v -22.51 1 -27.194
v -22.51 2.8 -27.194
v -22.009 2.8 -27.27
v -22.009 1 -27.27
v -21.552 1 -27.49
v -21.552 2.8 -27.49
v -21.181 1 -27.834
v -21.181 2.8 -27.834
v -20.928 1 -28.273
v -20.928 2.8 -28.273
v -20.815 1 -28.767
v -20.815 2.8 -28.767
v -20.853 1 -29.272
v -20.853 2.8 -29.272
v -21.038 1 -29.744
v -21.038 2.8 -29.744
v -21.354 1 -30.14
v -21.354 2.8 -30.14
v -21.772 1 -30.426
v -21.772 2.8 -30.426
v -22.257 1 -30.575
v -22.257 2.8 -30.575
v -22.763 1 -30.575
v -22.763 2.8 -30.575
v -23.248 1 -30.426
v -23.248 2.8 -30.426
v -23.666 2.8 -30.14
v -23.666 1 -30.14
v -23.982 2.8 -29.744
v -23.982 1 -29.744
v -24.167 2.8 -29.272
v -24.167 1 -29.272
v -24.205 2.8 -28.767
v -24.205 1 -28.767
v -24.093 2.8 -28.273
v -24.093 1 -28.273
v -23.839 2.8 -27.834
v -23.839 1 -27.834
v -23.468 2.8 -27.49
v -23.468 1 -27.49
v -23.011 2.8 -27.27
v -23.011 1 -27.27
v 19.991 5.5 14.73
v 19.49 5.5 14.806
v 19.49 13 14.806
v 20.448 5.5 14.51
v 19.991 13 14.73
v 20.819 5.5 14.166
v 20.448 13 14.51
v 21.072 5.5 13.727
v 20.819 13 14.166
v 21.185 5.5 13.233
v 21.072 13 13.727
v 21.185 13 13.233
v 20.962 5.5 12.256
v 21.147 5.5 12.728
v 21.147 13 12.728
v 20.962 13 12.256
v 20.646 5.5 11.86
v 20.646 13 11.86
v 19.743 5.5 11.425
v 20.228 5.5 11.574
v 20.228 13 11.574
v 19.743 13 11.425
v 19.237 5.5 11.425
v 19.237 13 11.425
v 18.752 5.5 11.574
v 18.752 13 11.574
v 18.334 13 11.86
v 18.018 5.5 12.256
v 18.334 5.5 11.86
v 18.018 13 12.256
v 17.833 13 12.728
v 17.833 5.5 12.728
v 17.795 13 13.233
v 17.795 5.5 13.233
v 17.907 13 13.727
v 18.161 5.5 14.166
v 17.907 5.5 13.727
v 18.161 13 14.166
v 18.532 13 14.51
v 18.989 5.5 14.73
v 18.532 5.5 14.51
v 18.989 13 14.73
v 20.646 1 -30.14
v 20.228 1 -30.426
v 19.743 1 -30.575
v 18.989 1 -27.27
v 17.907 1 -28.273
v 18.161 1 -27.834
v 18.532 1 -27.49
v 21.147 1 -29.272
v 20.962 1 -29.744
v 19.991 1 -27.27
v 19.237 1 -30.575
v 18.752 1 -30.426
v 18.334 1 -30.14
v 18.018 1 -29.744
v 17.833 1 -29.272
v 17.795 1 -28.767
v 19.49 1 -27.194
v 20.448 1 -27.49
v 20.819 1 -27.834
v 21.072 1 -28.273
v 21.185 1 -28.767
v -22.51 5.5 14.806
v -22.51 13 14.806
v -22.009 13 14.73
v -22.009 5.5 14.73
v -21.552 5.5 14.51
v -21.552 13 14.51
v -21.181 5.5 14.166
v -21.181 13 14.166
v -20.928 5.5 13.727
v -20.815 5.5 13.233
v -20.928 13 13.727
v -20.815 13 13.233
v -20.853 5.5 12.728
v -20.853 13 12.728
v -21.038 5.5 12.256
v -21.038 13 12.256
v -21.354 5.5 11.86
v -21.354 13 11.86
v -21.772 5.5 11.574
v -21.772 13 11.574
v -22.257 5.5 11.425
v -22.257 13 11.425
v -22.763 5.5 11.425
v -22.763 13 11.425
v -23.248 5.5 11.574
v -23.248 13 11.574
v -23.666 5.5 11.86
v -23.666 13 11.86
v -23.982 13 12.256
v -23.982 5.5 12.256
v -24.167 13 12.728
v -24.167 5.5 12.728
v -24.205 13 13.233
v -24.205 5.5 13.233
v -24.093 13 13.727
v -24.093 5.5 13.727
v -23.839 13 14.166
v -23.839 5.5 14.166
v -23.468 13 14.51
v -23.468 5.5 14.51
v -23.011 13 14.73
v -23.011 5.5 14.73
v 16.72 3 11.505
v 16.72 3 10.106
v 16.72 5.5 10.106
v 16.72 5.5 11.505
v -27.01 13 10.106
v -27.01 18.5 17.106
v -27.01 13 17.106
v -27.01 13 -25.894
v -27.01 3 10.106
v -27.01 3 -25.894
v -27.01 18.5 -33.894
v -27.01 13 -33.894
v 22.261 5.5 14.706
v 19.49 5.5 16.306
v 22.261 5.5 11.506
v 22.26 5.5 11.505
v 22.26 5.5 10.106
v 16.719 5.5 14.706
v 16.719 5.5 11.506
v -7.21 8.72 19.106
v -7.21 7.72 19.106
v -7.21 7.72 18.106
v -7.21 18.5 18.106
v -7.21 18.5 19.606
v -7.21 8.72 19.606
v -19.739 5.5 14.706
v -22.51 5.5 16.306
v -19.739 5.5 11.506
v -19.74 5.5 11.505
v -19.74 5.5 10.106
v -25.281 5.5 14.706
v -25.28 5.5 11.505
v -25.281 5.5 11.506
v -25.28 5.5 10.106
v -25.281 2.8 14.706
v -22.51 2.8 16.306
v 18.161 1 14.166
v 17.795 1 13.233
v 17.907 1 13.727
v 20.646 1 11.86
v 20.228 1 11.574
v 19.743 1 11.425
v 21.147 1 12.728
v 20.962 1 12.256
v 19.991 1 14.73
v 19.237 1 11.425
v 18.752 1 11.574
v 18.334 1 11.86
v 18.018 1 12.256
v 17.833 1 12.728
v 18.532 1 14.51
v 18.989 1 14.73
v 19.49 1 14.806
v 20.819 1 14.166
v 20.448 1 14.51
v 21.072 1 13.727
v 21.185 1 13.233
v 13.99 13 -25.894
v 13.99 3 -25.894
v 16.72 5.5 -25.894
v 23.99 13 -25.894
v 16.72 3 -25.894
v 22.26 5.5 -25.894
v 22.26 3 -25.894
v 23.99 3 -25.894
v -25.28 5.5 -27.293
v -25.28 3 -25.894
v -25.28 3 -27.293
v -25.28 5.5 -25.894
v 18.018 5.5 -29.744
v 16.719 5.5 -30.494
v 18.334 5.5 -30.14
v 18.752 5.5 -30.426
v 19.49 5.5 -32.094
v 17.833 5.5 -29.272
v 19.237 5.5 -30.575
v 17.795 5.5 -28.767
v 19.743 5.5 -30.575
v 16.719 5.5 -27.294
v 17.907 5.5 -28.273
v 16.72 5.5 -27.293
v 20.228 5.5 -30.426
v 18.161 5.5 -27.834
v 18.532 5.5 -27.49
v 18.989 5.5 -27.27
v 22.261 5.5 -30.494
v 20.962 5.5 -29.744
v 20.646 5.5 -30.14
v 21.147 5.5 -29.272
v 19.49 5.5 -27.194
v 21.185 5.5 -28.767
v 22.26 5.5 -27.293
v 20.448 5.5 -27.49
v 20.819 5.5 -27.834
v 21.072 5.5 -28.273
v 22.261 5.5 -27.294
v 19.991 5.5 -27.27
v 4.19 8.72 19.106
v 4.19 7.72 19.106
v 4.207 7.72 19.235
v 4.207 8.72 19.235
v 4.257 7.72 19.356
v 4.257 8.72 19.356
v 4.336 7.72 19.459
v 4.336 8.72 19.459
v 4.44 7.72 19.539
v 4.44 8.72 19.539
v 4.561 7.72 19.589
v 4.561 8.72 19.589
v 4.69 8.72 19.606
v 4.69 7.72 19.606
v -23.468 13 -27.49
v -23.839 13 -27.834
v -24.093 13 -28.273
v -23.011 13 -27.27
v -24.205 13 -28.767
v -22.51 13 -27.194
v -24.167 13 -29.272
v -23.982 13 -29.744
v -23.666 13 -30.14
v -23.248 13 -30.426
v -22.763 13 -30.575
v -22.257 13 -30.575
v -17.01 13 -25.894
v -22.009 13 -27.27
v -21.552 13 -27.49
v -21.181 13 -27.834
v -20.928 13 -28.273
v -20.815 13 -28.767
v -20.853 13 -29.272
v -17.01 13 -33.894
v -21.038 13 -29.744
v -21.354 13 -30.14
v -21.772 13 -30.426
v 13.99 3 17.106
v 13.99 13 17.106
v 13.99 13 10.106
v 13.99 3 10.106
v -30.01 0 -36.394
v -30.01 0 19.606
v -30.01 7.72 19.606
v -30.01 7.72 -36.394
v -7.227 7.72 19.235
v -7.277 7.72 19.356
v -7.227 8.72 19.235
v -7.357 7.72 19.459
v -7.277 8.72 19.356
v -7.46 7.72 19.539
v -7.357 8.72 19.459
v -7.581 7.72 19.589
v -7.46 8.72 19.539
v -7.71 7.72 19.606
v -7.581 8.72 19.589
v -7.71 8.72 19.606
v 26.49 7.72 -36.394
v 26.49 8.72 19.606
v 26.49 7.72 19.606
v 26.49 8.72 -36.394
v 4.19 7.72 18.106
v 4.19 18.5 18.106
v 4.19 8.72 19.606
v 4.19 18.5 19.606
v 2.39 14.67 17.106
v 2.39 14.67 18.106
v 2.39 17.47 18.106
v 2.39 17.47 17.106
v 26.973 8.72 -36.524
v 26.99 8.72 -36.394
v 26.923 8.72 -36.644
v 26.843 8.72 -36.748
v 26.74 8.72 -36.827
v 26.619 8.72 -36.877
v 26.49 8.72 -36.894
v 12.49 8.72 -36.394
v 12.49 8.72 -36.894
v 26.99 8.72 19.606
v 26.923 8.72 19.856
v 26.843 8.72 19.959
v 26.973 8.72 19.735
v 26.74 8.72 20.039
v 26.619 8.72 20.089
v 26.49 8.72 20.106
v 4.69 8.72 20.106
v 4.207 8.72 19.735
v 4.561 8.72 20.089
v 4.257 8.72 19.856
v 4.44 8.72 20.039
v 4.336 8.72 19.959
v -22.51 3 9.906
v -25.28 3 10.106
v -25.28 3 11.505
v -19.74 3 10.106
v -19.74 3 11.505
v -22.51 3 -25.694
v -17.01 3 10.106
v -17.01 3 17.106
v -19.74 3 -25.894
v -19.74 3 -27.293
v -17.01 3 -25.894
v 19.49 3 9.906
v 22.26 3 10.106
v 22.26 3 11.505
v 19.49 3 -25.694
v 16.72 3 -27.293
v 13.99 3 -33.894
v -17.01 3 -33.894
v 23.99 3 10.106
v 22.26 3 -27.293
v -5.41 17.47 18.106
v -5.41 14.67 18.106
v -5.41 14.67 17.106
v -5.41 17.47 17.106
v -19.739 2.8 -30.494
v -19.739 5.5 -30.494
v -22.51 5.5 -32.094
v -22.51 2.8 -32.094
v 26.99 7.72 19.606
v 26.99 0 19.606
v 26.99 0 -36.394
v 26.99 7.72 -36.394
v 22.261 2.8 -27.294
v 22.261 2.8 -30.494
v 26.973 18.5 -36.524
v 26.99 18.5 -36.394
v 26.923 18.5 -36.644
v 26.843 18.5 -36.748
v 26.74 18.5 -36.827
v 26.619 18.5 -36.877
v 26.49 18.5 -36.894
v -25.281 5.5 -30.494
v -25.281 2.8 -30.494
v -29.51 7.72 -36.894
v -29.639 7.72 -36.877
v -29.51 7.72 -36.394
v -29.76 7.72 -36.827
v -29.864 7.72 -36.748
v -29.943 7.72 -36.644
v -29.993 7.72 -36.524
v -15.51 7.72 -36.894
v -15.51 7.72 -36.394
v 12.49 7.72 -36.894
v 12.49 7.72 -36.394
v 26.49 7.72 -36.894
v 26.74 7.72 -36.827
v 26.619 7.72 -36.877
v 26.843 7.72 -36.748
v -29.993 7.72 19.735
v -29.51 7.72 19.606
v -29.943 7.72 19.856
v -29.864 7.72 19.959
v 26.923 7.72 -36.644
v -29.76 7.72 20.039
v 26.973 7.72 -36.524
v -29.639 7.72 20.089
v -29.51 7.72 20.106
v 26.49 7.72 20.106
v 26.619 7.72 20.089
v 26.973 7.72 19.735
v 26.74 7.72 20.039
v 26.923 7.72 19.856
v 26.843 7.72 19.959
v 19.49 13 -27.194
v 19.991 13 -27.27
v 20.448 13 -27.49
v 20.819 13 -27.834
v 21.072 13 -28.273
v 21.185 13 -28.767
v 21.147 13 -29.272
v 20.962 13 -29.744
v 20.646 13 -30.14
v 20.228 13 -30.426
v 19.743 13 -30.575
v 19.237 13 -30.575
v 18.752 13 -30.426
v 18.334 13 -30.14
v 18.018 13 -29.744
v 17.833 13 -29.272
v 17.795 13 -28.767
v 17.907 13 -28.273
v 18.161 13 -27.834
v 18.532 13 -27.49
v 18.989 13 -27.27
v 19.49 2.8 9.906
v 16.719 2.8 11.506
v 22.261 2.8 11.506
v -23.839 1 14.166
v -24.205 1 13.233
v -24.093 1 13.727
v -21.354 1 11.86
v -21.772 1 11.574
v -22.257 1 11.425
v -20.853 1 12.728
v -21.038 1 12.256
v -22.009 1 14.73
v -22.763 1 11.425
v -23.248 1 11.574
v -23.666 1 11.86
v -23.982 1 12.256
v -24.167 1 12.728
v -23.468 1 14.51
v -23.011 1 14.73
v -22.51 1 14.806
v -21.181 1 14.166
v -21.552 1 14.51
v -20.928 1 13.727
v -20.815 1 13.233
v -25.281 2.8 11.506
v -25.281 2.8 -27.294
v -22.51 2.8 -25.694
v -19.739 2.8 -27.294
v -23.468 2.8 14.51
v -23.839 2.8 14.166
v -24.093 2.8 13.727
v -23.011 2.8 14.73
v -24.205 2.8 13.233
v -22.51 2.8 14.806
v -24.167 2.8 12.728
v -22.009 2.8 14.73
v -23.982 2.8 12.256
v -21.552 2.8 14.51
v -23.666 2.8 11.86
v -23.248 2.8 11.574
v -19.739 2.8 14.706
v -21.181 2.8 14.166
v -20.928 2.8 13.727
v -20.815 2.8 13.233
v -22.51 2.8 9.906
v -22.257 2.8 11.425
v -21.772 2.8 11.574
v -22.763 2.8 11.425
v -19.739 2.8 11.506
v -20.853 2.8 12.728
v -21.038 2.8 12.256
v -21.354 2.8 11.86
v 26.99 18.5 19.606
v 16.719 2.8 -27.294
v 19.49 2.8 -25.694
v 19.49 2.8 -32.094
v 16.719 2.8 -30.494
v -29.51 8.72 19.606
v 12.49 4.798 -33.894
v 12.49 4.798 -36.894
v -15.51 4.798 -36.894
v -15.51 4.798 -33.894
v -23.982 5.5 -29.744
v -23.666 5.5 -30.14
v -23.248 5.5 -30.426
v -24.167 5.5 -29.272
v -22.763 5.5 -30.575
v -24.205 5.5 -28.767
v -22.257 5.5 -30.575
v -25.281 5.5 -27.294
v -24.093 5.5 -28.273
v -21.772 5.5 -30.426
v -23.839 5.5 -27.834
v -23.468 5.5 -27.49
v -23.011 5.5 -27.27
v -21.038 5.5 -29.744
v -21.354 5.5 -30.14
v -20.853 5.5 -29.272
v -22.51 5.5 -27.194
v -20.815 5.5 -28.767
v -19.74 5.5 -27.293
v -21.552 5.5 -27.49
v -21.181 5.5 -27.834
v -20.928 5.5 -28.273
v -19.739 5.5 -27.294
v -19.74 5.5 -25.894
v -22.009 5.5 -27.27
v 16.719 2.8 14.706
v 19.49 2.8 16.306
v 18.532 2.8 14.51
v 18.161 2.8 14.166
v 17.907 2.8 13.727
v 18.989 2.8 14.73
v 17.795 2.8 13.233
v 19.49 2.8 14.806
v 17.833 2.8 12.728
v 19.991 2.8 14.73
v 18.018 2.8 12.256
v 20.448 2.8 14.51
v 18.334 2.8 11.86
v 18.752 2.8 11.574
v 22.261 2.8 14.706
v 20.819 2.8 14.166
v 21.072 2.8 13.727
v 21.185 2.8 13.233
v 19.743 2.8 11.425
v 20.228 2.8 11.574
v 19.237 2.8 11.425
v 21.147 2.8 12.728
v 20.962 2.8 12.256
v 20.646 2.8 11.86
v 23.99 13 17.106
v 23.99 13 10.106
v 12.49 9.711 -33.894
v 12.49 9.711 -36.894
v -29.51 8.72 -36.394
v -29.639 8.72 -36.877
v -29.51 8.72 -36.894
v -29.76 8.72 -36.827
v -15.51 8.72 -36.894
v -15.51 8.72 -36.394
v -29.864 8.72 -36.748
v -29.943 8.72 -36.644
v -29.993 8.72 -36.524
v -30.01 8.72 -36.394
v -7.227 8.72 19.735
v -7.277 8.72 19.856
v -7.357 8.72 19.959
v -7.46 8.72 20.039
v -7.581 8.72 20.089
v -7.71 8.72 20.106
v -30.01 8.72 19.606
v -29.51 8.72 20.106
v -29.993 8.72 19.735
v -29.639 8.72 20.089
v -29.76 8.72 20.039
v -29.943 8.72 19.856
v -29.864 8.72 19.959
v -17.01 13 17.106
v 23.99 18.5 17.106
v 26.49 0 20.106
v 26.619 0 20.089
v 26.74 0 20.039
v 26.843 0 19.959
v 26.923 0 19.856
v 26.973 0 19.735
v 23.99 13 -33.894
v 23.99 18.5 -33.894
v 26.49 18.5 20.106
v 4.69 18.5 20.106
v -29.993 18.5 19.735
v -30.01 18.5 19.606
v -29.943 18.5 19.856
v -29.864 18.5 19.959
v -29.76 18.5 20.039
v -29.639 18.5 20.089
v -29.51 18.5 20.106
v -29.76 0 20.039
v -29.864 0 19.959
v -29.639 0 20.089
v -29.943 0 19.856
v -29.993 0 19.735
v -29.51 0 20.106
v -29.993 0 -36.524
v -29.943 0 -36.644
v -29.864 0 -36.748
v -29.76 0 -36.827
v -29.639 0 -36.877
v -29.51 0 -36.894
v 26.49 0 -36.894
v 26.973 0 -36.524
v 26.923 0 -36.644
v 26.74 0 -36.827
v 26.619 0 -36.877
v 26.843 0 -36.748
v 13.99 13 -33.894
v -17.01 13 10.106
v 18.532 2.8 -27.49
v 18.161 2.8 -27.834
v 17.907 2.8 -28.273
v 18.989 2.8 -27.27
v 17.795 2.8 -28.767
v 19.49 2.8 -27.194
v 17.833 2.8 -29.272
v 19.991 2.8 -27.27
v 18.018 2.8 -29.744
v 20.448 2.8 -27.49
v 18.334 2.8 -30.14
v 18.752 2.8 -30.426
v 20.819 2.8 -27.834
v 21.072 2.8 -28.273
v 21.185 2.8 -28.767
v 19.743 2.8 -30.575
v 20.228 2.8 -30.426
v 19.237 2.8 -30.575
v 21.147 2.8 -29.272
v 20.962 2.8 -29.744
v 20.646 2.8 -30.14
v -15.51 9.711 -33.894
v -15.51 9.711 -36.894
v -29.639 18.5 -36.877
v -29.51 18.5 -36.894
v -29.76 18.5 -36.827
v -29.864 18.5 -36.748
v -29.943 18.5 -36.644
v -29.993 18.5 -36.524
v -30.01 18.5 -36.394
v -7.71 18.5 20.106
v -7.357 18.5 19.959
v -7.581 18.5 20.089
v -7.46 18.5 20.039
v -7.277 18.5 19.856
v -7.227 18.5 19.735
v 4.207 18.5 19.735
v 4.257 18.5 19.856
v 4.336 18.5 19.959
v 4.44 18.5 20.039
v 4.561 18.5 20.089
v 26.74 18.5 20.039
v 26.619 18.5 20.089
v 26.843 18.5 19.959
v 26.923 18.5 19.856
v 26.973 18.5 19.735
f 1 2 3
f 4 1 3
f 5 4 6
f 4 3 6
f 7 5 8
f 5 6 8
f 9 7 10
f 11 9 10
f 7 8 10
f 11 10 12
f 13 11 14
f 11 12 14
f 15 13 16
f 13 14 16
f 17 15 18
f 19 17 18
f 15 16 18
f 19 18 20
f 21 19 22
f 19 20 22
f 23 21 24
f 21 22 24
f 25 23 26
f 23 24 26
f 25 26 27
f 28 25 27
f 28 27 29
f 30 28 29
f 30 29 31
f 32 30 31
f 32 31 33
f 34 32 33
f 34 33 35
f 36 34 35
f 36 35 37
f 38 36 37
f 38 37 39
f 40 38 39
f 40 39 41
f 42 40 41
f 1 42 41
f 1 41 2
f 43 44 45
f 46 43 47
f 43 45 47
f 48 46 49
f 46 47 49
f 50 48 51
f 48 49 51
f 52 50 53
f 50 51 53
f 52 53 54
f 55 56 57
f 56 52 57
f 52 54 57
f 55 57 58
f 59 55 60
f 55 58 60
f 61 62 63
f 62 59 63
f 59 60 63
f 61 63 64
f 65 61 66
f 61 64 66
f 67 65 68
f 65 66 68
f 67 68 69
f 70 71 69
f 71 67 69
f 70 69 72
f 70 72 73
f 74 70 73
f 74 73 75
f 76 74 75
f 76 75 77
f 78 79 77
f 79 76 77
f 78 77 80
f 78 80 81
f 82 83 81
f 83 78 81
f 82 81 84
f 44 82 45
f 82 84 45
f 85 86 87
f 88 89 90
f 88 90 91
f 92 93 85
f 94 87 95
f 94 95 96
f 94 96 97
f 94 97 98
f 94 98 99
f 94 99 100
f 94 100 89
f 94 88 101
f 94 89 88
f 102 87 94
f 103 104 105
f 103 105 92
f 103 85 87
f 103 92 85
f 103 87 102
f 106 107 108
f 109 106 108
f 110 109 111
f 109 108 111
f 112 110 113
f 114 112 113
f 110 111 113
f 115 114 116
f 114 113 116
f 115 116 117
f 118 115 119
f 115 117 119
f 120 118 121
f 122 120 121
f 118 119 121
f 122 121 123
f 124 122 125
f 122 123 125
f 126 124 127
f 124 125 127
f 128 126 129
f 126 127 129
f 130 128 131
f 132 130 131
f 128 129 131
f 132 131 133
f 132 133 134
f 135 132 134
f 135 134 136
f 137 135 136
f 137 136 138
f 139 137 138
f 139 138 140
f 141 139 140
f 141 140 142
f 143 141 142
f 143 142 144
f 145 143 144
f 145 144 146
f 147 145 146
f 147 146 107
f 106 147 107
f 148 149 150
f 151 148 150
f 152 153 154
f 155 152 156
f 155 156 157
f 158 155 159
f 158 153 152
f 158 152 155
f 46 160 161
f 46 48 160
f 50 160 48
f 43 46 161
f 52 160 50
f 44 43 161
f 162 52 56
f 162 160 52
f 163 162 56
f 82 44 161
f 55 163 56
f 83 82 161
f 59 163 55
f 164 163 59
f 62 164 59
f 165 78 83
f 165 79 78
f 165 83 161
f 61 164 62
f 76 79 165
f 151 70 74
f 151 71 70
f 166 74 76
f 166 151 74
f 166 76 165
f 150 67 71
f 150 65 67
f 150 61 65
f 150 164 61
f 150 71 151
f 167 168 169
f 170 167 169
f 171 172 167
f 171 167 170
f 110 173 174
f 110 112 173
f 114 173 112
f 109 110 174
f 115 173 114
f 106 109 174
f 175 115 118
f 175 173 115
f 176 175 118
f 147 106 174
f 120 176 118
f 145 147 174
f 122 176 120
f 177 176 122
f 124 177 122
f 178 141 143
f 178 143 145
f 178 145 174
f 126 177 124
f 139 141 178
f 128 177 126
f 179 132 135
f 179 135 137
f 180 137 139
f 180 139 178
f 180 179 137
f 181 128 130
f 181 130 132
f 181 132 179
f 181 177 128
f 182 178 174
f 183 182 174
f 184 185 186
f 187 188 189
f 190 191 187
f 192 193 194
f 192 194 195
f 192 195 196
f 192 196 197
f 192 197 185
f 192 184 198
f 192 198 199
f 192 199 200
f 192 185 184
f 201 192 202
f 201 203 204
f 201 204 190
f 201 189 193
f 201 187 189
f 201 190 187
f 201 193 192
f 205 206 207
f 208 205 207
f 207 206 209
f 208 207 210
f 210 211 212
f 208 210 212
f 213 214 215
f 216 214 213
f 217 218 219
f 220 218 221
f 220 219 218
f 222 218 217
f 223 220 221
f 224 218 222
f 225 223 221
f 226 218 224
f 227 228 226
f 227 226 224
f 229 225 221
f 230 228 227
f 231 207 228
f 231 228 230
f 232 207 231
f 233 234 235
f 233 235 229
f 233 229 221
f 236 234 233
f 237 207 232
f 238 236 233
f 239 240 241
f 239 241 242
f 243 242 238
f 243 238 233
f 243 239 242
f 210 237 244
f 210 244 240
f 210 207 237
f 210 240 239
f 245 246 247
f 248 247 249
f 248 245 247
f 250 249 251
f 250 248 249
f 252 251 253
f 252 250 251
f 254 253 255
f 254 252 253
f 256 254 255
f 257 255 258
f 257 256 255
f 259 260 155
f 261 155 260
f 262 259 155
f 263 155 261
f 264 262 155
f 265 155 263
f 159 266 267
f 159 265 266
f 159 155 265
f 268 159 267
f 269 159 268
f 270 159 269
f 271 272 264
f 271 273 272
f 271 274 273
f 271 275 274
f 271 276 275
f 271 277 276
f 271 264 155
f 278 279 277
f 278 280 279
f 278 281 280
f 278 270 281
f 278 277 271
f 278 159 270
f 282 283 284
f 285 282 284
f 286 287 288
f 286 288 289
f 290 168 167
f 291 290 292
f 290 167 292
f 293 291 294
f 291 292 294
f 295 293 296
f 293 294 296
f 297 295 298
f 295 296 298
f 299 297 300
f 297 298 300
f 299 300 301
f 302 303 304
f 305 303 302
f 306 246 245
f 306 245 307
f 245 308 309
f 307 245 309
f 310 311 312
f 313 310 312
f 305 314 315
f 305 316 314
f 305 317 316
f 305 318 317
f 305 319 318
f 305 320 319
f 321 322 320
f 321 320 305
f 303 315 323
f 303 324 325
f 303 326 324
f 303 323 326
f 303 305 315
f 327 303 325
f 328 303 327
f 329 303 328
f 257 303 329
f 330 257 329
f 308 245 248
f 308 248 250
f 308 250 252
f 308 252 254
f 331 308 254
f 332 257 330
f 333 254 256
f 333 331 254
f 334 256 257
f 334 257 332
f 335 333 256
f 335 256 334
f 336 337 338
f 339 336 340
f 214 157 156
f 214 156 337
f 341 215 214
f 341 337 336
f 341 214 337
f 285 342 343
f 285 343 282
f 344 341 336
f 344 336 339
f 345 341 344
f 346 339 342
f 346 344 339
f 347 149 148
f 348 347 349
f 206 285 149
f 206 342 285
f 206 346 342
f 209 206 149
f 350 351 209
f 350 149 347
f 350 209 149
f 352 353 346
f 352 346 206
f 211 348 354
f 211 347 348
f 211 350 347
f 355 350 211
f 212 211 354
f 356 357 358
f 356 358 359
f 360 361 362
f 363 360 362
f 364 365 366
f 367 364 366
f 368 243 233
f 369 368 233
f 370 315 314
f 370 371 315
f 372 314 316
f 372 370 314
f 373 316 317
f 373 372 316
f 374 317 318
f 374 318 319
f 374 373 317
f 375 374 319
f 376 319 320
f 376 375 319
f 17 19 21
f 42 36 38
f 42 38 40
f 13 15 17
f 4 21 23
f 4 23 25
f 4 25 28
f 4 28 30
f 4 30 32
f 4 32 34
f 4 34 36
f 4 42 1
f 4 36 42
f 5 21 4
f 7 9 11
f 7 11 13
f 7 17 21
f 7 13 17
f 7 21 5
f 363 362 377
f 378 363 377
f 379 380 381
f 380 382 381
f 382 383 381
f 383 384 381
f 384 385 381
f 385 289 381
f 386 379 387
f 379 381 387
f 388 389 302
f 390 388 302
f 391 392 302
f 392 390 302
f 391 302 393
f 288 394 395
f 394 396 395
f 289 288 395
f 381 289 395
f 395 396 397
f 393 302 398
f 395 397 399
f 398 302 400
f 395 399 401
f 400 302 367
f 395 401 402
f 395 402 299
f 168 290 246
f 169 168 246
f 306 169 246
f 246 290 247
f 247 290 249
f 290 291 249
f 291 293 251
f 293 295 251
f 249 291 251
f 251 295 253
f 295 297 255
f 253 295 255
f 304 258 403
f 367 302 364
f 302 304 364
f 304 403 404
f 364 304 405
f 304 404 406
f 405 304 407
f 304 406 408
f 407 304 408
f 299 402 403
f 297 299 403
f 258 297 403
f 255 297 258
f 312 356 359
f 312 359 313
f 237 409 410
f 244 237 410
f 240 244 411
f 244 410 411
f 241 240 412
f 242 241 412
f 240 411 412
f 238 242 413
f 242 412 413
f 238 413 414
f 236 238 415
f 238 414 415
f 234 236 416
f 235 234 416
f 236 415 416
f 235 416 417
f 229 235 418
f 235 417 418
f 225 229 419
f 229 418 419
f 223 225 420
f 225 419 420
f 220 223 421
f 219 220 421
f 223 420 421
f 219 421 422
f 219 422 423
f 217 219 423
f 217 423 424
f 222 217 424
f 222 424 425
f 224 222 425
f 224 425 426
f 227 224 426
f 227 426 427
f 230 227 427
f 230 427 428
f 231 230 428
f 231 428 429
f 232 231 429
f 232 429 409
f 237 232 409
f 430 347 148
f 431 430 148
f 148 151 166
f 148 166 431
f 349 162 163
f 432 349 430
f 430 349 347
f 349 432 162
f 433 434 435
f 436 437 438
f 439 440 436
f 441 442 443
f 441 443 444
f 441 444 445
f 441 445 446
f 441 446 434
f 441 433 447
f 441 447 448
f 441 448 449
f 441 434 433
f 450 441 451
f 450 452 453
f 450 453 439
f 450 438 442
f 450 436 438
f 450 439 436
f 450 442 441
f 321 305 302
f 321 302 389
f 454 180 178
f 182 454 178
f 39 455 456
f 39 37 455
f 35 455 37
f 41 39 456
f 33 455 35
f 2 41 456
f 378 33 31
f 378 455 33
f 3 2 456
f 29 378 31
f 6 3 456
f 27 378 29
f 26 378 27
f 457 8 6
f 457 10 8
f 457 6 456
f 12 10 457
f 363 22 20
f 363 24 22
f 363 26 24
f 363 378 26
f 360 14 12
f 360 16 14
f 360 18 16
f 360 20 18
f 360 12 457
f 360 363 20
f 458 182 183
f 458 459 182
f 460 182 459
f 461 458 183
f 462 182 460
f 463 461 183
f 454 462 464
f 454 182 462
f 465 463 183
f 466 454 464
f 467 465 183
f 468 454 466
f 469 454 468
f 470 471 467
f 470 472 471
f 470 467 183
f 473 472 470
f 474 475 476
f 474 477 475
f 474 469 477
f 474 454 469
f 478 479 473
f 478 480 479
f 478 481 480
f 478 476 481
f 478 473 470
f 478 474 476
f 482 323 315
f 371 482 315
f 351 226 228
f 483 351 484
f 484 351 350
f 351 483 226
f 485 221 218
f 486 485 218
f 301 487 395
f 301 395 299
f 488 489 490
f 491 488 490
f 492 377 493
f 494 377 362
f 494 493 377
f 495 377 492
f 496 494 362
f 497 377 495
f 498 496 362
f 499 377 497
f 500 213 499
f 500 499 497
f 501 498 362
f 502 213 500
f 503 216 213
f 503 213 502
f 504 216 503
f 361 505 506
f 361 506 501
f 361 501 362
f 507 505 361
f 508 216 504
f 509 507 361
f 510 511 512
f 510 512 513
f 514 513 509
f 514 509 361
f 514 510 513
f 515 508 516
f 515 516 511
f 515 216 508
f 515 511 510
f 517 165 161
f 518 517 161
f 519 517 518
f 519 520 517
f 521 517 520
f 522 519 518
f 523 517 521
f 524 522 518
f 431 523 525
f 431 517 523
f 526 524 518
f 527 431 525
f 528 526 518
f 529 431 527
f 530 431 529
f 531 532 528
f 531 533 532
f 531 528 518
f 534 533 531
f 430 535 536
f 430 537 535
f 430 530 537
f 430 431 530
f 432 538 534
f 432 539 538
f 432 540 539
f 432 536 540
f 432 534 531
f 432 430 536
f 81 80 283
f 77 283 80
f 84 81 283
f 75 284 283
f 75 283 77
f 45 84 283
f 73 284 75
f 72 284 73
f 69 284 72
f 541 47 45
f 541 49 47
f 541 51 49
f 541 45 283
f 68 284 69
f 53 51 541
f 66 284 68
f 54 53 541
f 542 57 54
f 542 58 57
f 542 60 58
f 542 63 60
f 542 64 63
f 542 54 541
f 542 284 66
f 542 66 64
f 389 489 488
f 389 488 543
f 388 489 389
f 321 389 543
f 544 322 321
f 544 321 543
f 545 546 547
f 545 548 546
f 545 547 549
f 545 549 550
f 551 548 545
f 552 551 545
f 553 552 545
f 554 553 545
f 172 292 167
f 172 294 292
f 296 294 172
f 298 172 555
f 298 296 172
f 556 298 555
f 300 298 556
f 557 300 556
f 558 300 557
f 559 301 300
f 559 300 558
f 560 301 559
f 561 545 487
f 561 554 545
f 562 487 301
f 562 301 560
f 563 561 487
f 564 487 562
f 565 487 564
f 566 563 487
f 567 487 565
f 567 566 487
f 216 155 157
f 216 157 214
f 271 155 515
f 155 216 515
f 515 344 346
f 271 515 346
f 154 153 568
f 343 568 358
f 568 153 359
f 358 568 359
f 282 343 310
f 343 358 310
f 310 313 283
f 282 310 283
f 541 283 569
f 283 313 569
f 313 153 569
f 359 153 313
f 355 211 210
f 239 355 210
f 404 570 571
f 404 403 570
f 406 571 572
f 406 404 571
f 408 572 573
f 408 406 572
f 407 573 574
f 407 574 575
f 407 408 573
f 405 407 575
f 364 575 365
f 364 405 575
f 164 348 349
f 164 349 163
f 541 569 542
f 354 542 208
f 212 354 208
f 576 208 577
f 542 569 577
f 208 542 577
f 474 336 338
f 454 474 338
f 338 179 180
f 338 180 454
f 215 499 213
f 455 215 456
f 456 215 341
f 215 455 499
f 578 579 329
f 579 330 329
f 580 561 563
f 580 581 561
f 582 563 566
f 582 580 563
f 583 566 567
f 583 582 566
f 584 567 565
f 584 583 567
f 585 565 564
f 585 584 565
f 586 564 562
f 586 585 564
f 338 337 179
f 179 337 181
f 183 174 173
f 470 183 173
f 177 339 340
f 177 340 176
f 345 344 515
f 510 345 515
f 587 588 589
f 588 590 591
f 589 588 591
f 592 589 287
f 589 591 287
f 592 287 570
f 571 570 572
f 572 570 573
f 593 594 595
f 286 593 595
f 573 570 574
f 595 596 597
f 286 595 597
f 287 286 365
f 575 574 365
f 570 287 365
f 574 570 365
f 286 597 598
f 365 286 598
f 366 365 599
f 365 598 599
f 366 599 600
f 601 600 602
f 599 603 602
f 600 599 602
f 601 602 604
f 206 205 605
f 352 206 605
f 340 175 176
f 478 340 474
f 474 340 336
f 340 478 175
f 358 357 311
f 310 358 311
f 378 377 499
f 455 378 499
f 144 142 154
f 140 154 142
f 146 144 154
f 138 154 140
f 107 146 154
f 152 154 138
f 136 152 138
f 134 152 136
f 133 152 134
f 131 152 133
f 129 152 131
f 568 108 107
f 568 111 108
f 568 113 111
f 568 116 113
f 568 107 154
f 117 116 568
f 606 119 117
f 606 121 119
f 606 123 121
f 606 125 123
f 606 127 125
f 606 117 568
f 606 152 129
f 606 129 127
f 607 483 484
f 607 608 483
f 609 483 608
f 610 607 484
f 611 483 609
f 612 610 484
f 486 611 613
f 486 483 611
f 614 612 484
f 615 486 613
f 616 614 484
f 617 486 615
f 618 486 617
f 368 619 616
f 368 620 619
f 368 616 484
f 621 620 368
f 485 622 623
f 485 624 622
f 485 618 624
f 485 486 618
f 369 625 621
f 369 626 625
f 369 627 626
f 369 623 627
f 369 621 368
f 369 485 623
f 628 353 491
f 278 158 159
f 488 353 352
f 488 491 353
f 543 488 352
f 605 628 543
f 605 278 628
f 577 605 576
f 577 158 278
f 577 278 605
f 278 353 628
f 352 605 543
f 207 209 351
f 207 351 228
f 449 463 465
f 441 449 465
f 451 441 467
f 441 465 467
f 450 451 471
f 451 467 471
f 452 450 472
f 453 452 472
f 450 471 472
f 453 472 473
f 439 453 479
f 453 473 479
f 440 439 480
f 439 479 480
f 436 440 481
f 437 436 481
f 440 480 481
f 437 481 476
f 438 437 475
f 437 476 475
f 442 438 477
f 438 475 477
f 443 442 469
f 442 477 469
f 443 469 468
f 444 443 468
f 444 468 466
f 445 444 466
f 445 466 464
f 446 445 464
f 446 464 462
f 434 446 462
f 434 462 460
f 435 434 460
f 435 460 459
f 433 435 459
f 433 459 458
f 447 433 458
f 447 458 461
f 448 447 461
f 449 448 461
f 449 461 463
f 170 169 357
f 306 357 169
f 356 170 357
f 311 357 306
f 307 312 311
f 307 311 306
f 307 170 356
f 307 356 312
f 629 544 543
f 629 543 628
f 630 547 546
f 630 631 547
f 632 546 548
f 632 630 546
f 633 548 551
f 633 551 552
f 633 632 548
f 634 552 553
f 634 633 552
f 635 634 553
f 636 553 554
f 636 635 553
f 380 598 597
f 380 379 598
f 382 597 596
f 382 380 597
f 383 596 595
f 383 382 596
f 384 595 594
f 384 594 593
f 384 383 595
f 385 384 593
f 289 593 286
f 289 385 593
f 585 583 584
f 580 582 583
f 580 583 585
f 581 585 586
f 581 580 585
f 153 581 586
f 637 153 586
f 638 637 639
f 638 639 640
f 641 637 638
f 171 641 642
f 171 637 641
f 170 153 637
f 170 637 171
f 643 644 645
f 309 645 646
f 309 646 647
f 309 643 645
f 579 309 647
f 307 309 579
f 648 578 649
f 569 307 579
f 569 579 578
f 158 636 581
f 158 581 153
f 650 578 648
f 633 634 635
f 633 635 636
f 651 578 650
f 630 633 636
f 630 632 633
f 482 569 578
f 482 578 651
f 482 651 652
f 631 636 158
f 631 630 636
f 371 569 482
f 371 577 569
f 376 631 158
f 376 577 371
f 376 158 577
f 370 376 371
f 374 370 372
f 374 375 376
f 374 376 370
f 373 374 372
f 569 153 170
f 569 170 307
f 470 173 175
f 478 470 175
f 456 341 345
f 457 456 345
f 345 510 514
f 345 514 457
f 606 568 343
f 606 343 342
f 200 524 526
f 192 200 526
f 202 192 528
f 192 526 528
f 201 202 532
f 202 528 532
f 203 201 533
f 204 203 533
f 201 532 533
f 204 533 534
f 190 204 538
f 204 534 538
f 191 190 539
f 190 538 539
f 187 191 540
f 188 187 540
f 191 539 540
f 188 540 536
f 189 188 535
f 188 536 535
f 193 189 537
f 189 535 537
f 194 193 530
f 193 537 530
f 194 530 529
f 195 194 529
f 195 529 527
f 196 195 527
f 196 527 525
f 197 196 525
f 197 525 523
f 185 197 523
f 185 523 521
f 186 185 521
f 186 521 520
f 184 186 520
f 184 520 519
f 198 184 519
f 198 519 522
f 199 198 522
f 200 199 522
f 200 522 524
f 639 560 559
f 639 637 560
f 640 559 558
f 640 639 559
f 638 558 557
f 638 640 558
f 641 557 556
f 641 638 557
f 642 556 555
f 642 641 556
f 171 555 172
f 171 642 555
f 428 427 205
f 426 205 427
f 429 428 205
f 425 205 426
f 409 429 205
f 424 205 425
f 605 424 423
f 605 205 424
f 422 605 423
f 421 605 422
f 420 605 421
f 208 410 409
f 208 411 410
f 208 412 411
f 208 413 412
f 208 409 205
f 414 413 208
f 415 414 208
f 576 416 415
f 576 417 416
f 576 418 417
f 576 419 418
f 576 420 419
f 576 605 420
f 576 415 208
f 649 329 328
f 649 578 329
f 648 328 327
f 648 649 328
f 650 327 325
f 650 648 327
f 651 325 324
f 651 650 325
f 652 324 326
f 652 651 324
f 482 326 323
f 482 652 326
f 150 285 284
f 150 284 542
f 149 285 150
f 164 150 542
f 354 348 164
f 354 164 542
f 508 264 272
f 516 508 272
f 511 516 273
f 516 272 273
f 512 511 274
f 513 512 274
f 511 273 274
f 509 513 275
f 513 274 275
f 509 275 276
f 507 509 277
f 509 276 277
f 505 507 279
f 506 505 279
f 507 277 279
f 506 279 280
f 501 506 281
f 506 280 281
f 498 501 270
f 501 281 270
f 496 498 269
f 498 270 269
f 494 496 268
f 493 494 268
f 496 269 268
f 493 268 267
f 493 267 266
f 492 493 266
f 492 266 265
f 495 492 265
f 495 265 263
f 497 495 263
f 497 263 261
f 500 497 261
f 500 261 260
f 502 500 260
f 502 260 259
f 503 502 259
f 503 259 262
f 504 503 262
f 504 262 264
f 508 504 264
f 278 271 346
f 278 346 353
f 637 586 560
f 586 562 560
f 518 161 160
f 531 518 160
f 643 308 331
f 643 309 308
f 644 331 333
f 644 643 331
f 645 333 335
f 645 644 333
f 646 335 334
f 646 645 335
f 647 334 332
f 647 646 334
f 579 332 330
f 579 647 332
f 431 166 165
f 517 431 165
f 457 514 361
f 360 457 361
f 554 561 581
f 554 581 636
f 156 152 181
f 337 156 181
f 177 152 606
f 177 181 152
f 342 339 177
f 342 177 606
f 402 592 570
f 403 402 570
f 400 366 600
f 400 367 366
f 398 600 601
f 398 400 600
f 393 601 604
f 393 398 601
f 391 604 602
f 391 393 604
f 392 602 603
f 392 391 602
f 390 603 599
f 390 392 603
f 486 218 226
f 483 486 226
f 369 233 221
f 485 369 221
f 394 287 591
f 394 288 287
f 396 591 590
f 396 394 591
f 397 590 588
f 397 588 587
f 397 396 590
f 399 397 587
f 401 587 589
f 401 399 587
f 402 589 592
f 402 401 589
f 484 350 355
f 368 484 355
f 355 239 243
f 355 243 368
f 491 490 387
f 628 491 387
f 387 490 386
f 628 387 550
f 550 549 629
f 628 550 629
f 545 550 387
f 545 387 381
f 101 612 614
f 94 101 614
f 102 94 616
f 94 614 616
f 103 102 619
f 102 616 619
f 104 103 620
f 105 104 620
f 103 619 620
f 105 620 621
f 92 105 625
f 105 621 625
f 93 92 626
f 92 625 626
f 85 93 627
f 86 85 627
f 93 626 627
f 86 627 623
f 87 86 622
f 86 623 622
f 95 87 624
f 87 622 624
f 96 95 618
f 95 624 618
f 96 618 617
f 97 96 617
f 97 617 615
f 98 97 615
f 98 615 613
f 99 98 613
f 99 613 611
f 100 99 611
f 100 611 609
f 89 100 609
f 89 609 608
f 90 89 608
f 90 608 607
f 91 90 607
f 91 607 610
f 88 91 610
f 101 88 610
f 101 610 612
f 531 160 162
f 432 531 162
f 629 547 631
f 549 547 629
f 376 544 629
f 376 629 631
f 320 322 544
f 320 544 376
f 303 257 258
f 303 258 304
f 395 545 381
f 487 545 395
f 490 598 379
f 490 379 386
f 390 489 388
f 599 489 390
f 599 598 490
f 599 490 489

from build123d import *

# Parameters (mm, degrees)
ESQUISSE1_W              = 57
ESQUISSE1_H              = 57
BOSS_EXTRU_1_DEPTH       = 18.5
ESQUISSE2_W              = 51
ESQUISSE2_H              = 51
ENL_V_MAT_EXTRU_1_DEPTH  = 15.5
ESQUISSE4_W              = 10
ESQUISSE4_H              = 8
BOSS_EXTRU_2_DEPTH       = 10
ESQUISSE5_W              = 10
ESQUISSE5_H              = 8
BOSS_EXTRU_3_DEPTH       = 10
ESQUISSE6_W              = 10
ESQUISSE6_H              = 7
BOSS_EXTRU_4_DEPTH       = 10
ESQUISSE7_W              = 10
ESQUISSE7_H              = 7
BOSS_EXTRU_5_DEPTH       = 10
ESQUISSE8_R              = 1.7
ENL_V_MAT_EXTRU_2_DEPTH  = 12
ESQUISSE9_R              = 1.7
ENL_V_MAT_EXTRU_3_DEPTH  = 12
ESQUISSE16_R             = 1.7
ENL_V_MAT_EXTRU_9_DEPTH  = 12
ESQUISSE17_R             = 1.7
ENL_V_MAT_EXTRU_10_DEPTH = 12
ESQUISSE21_W             = 7.8
ESQUISSE21_H             = 2.8
ENL_V_MAT_EXTRU_14_DEPTH = 3
ENL_V_START              = -7.5
ENL_V_MAT_EXTRU_18_DEPTH = 2.7
ENL_V_MAT_EXTRU_20_DEPTH = 2.7
ESQUISSE26_W             = 5.54
ESQUISSE26_H             = 2.5
ENL_V_MAT_EXTRU_21_DEPTH = 2.847955181
ENL_V_MAT_EXTRU_22_DEPTH = 2.7
ENL_V_MAT_EXTRU_24_DEPTH = 2.7
ESQUISSE23_W             = 5.54
ESQUISSE23_H             = 2.5
ENL_V_MAT_EXTRU_26_DEPTH = 2
ESQUISSE31_W             = 5.54
ESQUISSE31_H             = 2.5
ENL_V_MAT_EXTRU_27_DEPTH = 2
ESQUISSE30_W             = 5.54
ESQUISSE30_H             = 2.5
ENL_V_MAT_EXTRU_28_DEPTH = 2
ESQUISSE32_W             = 57
ESQUISSE32_H             = 1
ENL_V_MAT_EXTRU_29_DEPTH = 0.5
ESQUISSE33_W             = 57
ESQUISSE33_H             = 1
ENL_V_MAT_EXTRU_30_DEPTH = 0.5
ESQUISSE34_W             = 57
ESQUISSE34_H             = 1
ENL_V_MAT_EXTRU_31_DEPTH = 0.5
ESQUISSE35_W             = 57
ESQUISSE35_H             = 1
ENL_V_MAT_EXTRU_32_DEPTH = 0.5
ESQUISSE36_W             = 11.4
ESQUISSE36_H             = 10.780005484
ENL_V_MAT_EXTRU_33_DEPTH = 2
CONG_1_R                 = 0.5
CONG_2_R                 = 0.5
CONG_3_R                 = 0.5
CONG_4_R                 = 0.5
CONG_5_R                 = 0.5
CONG_6_R                 = 0.5
CONG_7_R                 = 0.5
CONG_8_R                 = 0.5
CONG_9_R                 = 0.5
CONG_10_R                = 0.5
CONG_11_R                = 0.5
CONG_12_R                = 0.5
ESQUISSE38_W             = 28
ESQUISSE38_H             = 4.913001224
ENL_V_MAT_EXTRU_34_DEPTH = 3


with BuildPart() as part:
    # Esquisse1 → Boss.-Extru.1 (new body)
    with BuildSketch(Plane(origin=(0, 0, 0), x_dir=(1, 0, 0), z_dir=(0, 1, 0))):
        with Locations((-1.510072399, 8.394175698)):
            Rectangle(ESQUISSE1_W, ESQUISSE1_H)
    extrude(amount=BOSS_EXTRU_1_DEPTH)

    # Esquisse2 → Enlèv. mat.-Extru.1 (cut)
    with BuildSketch(Plane(origin=(0, 18.5, 0), x_dir=(1, 0, 0), z_dir=(0, 1, 0))):
        with Locations((-1.510072399, 8.394175698)):
            Rectangle(ESQUISSE2_W, ESQUISSE2_H)
    extrude(amount=-ENL_V_MAT_EXTRU_1_DEPTH, mode=Mode.SUBTRACT)

    # Esquisse4 → Boss.-Extru.2 (add)
    with BuildSketch(Plane(origin=(0, 3, 0), x_dir=(1, 0, 0), z_dir=(0, 1, 0))):
        with Locations((-22.010072399, 29.894175698)):
            Rectangle(ESQUISSE4_W, ESQUISSE4_H)
    extrude(amount=BOSS_EXTRU_2_DEPTH)

    # Esquisse5 → Boss.-Extru.3 (add)
    with BuildSketch(Plane(origin=(0, 3, 0), x_dir=(1, 0, 0), z_dir=(0, 1, 0))):
        with Locations((18.989927601, 29.894175698)):
            Rectangle(ESQUISSE5_W, ESQUISSE5_H)
    extrude(amount=BOSS_EXTRU_3_DEPTH)

    # Esquisse6 → Boss.-Extru.4 (add)
    with BuildSketch(Plane(origin=(0, 3, 0), x_dir=(1, 0, 0), z_dir=(0, 1, 0))):
        with Locations((18.989927601, -13.605824302)):
            Rectangle(ESQUISSE6_W, ESQUISSE6_H)
    extrude(amount=BOSS_EXTRU_4_DEPTH)

    # Esquisse7 → Boss.-Extru.5 (add)
    with BuildSketch(Plane(origin=(0, 3, 0), x_dir=(1, 0, 0), z_dir=(0, 1, 0))):
        with Locations((-22.010072399, -13.605824302)):
            Rectangle(ESQUISSE7_W, ESQUISSE7_H)
    extrude(amount=BOSS_EXTRU_5_DEPTH)

    # Esquisse8 → Enlèv. mat.-Extru.2 (cut)
    with BuildSketch(Plane(origin=(0, 13, 0), x_dir=(1, 0, 0), z_dir=(0, 1, 0))):
        with Locations(Location((19.489927601, -13.105824302, 0), (0, 0, 270))):
            Circle(ESQUISSE8_R)
    extrude(amount=-ENL_V_MAT_EXTRU_2_DEPTH, mode=Mode.SUBTRACT)

    # Esquisse9 → Enlèv. mat.-Extru.3 (cut)
    with BuildSketch(Plane(origin=(0, 13, 0), x_dir=(1, 0, 0), z_dir=(0, 1, 0))):
        with Locations(Location((-22.510072399, -13.105824302, 0), (0, 0, 270))):
            Circle(ESQUISSE9_R)
    extrude(amount=-ENL_V_MAT_EXTRU_3_DEPTH, mode=Mode.SUBTRACT)

    # Esquisse16 → Enlèv. mat.-Extru.9 (cut)
    with BuildSketch(Plane(origin=(0, 13, 0), x_dir=(1, 0, 0), z_dir=(0, 1, 0))):
        with Locations(Location((-22.510072399, 28.894175698, 0), (0, 0, 270))):
            Circle(ESQUISSE16_R)
    extrude(amount=-ENL_V_MAT_EXTRU_9_DEPTH, mode=Mode.SUBTRACT)

    # Esquisse17 → Enlèv. mat.-Extru.10 (cut)
    with BuildSketch(Plane(origin=(0, 13, 0), x_dir=(1, 0, 0), z_dir=(0, 1, 0))):
        with Locations(Location((19.489927601, 28.894175698, 0), (0, 0, 270))):
            Circle(ESQUISSE17_R)
    extrude(amount=-ENL_V_MAT_EXTRU_10_DEPTH, mode=Mode.SUBTRACT)

    # Esquisse21 → Enlèv. mat.-Extru.14 (cut)
    with BuildSketch(Plane.XY.offset(20.105824302)):
        with Locations((-1.510072399, 16.07)):
            Rectangle(ESQUISSE21_W, ESQUISSE21_H)
    extrude(amount=-ENL_V_MAT_EXTRU_14_DEPTH, mode=Mode.SUBTRACT)

    # Esquisse24 → Enlèv. mat.-Extru.18 (cut)
    with BuildSketch(Plane(origin=(0, 13, 0), x_dir=(1, 0, 0), z_dir=(0, 1, 0)).offset(ENL_V_START)):
        Polygon((19.489927601, 25.694175698), (22.261208893, 27.294175698), (22.261208893, 30.494175698), (19.489927601, 32.094175698), (16.718646309, 30.494175698), (16.718646309, 27.294175698), align=None)
    extrude(amount=-ENL_V_MAT_EXTRU_18_DEPTH, mode=Mode.SUBTRACT)

    # Esquisse25 → Enlèv. mat.-Extru.20 (cut)
    with BuildSketch(Plane(origin=(0, 13, 0), x_dir=(1, 0, 0), z_dir=(0, 1, 0)).offset(ENL_V_START)):
        Polygon((16.718646309, -11.505824302), (16.718646309, -14.705824302), (19.489927601, -16.305824302), (22.261208893, -14.705824302), (22.261208893, -11.505824302), (19.489927601, -9.905824302), align=None)
    extrude(amount=-ENL_V_MAT_EXTRU_20_DEPTH, mode=Mode.SUBTRACT)

    # Esquisse26 → Enlèv. mat.-Extru.21 (cut)
    with BuildSketch(Plane(origin=(0, 0, 10.105824302), x_dir=(-1, 0, 0), z_dir=(0, 0, -1))):
        with Locations((-19.489927601, 4.25)):
            Rectangle(ESQUISSE26_W, ESQUISSE26_H)
    extrude(amount=-ENL_V_MAT_EXTRU_21_DEPTH, mode=Mode.SUBTRACT)

    # Esquisse27 → Enlèv. mat.-Extru.22 (cut)
    with BuildSketch(Plane(origin=(0, 13, 0), x_dir=(1, 0, 0), z_dir=(0, 1, 0)).offset(ENL_V_START)):
        Polygon((-19.738791107, 27.294175698), (-19.738791107, 30.494175698), (-22.510072399, 32.094175698), (-25.281353691, 30.494175698), (-25.281353691, 27.294175698), (-22.510072399, 25.694175698), align=None)
    extrude(amount=-ENL_V_MAT_EXTRU_22_DEPTH, mode=Mode.SUBTRACT)

    # Esquisse29 → Enlèv. mat.-Extru.24 (cut)
    with BuildSketch(Plane(origin=(0, 13, 0), x_dir=(1, 0, 0), z_dir=(0, 1, 0)).offset(ENL_V_START)):
        Polygon((-19.738791107, -11.505824302), (-22.510072399, -9.905824302), (-25.281353691, -11.505824302), (-25.281353691, -14.705824302), (-22.510072399, -16.305824302), (-19.738791107, -14.705824302), align=None)
    extrude(amount=-ENL_V_MAT_EXTRU_24_DEPTH, mode=Mode.SUBTRACT)

    # Esquisse23 → Enlèv. mat.-Extru.26 (cut)
    with BuildSketch(Plane.XY.offset(-25.894175698)):
        with Locations((19.489927601, 4.25)):
            Rectangle(ESQUISSE23_W, ESQUISSE23_H)
    extrude(amount=-ENL_V_MAT_EXTRU_26_DEPTH, mode=Mode.SUBTRACT)

    # Esquisse31 → Enlèv. mat.-Extru.27 (cut)
    with BuildSketch(Plane.XY.offset(-25.894175698)):
        with Locations((-22.510072399, 4.25)):
            Rectangle(ESQUISSE31_W, ESQUISSE31_H)
    extrude(amount=-ENL_V_MAT_EXTRU_27_DEPTH, mode=Mode.SUBTRACT)

    # Esquisse30 → Enlèv. mat.-Extru.28 (cut)
    with BuildSketch(Plane(origin=(0, 0, 10.105824302), x_dir=(-1, 0, 0), z_dir=(0, 0, -1))):
        with Locations((22.510072399, 4.25)):
            Rectangle(ESQUISSE30_W, ESQUISSE30_H)
    extrude(amount=-ENL_V_MAT_EXTRU_28_DEPTH, mode=Mode.SUBTRACT)

    # Esquisse32 → Enlèv. mat.-Extru.29 (cut)
    with BuildSketch(Plane.ZY.offset(30.010072399)):
        with Locations((-8.394175698, 8.219994516)):
            Rectangle(ESQUISSE32_W, ESQUISSE32_H)
    extrude(amount=-ENL_V_MAT_EXTRU_29_DEPTH, mode=Mode.SUBTRACT)

    # Esquisse33 → Enlèv. mat.-Extru.30 (cut)
    with BuildSketch(Plane.XY.offset(20.105824302)):
        with Locations((-1.510072399, 8.219994516)):
            Rectangle(ESQUISSE33_W, ESQUISSE33_H)
    extrude(amount=-ENL_V_MAT_EXTRU_30_DEPTH, mode=Mode.SUBTRACT)

    # Esquisse34 → Enlèv. mat.-Extru.31 (cut)
    with BuildSketch(Plane(origin=(26.989927601, 0, 0), x_dir=(0, 0, -1), z_dir=(1, 0, 0))):
        with Locations((8.394175698, 8.219994516)):
            Rectangle(ESQUISSE34_W, ESQUISSE34_H)
    extrude(amount=-ENL_V_MAT_EXTRU_31_DEPTH, mode=Mode.SUBTRACT)

    # Esquisse35 → Enlèv. mat.-Extru.32 (cut)
    with BuildSketch(Plane(origin=(0, 0, -36.894175698), x_dir=(-1, 0, 0), z_dir=(0, 0, -1))):
        with Locations((1.510072399, 8.219994516)):
            Rectangle(ESQUISSE35_W, ESQUISSE35_H)
    extrude(amount=-ENL_V_MAT_EXTRU_32_DEPTH, mode=Mode.SUBTRACT)

    # Esquisse36 → Enlèv. mat.-Extru.33 (cut)
    with BuildSketch(Plane.XY.offset(20.105824302)):
        with Locations((-1.510072399, 13.109997258)):
            Rectangle(ESQUISSE36_W, ESQUISSE36_H)
    extrude(amount=-ENL_V_MAT_EXTRU_33_DEPTH, mode=Mode.SUBTRACT)

    # Congé1
    cong_1_edges = [part.edges().sort_by_distance(p)[0] for p in [
        (-7.210072399, 13.609997258, 20.105824302),
    ]]
    fillet(cong_1_edges, radius=CONG_1_R)

    # Congé2
    cong_2_edges = [part.edges().sort_by_distance(p)[0] for p in [
        (4.189927601, 13.609997258, 20.105824302),
    ]]
    fillet(cong_2_edges, radius=CONG_2_R)

    # Congé3
    cong_3_edges = [part.edges().sort_by_distance(p)[0] for p in [
        (-7.210072399, 8.219994516, 19.605824302),
    ]]
    fillet(cong_3_edges, radius=CONG_3_R)

    # Congé4
    cong_4_edges = [part.edges().sort_by_distance(p)[0] for p in [
        (4.189927601, 8.219994516, 19.605824302),
    ]]
    fillet(cong_4_edges, radius=CONG_4_R)

    # Congé5
    cong_5_edges = [part.edges().sort_by_distance(p)[0] for p in [
        (26.989927601, 13.609997258, 20.105824302),
    ]]
    fillet(cong_5_edges, radius=CONG_5_R)

    # Congé6
    cong_6_edges = [part.edges().sort_by_distance(p)[0] for p in [
        (26.989927601, 3.859997258, 20.105824302),
    ]]
    fillet(cong_6_edges, radius=CONG_6_R)

    # Congé7
    cong_7_edges = [part.edges().sort_by_distance(p)[0] for p in [
        (26.989927601, 13.609997258, -36.894175698),
    ]]
    fillet(cong_7_edges, radius=CONG_7_R)

    # Congé8
    cong_8_edges = [part.edges().sort_by_distance(p)[0] for p in [
        (26.989927601, 3.859997258, -36.894175698),
    ]]
    fillet(cong_8_edges, radius=CONG_8_R)

    # Congé9
    cong_9_edges = [part.edges().sort_by_distance(p)[0] for p in [
        (-30.010072399, 13.609997258, -36.894175698),
    ]]
    fillet(cong_9_edges, radius=CONG_9_R)

    # Congé10
    cong_10_edges = [part.edges().sort_by_distance(p)[0] for p in [
        (-30.010072399, 3.859997258, -36.894175698),
    ]]
    fillet(cong_10_edges, radius=CONG_10_R)

    # Congé11
    cong_11_edges = [part.edges().sort_by_distance(p)[0] for p in [
        (-30.010072399, 13.609997258, 20.105824302),
    ]]
    fillet(cong_11_edges, radius=CONG_11_R)

    # Congé12
    cong_12_edges = [part.edges().sort_by_distance(p)[0] for p in [
        (-30.010072399, 3.859997258, 20.105824302),
    ]]
    fillet(cong_12_edges, radius=CONG_12_R)

    # Esquisse38 → Enlèv. mat.-Extru.34 (cut)
    with BuildSketch(Plane(origin=(0, 0, -36.894175698), x_dir=(-1, 0, 0), z_dir=(0, 0, -1))):
        with Locations((1.510072399, 7.254987661)):
            Rectangle(ESQUISSE38_W, ESQUISSE38_H)
    extrude(amount=-ENL_V_MAT_EXTRU_34_DEPTH, mode=Mode.SUBTRACT)


solid = part.part
